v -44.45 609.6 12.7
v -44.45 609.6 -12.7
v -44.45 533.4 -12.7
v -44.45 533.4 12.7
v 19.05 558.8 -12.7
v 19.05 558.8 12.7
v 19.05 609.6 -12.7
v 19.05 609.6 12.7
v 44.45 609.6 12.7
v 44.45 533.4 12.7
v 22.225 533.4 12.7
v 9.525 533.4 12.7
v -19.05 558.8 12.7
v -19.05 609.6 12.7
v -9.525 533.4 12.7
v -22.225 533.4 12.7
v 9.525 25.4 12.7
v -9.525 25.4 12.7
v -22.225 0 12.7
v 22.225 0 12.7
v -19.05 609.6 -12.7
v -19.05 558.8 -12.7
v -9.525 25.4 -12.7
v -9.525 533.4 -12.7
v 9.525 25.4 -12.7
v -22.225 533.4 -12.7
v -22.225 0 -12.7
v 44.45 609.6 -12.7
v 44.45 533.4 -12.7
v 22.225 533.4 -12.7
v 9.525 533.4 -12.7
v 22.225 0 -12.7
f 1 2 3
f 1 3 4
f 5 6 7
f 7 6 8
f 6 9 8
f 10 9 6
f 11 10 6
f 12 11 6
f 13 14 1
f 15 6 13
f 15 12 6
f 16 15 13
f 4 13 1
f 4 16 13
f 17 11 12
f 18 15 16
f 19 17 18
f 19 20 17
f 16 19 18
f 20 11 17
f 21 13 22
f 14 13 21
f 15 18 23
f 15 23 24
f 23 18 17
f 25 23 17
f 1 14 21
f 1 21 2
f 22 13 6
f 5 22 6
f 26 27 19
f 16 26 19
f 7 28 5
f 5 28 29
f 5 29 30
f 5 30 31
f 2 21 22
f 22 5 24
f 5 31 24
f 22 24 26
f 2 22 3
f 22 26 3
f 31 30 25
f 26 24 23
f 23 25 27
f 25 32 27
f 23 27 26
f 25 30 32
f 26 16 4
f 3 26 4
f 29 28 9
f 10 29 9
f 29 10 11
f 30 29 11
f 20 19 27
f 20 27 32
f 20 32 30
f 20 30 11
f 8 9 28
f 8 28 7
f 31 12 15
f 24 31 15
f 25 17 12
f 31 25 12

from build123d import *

# Parameters (mm, degrees)
F0_W     = 44.45
F0_H     = 25.4
F1_DEPTH = 533.4
F2_W     = 19.05
F2_H     = 508
F3_DEPTH = 25.4
F4_W     = 88.9
F4_H     = 25.4
F5_DEPTH = 76.2
F6_W     = 38.1
F6_H     = 50.8
F7_DEPTH = 25.4


with BuildPart() as f1:
    # F0 (on Front) → F1 (new body)
    with BuildSketch(Plane.XZ):
        Rectangle(F0_W, F0_H)
    extrude(amount=-F1_DEPTH)

    # F2 (on face) → F3 (cut)
    with BuildSketch(Plane.XY.offset(12.7)):
        with Locations((0, 279.4)):
            Rectangle(F2_W, F2_H)
    extrude(amount=-F3_DEPTH, mode=Mode.SUBTRACT)

    # F4 (on face) → F5 (join)
    with BuildSketch(Plane(origin=(0, 533.4, 0), x_dir=(-1, 0, 0), z_dir=(0, 1, 0))):
        Rectangle(F4_W, F4_H)
    extrude(amount=F5_DEPTH)

    # F6 (on face) → F7 (cut)
    with BuildSketch(Plane.XY.offset(12.7)):
        with Locations((0, 584.2)):
            Rectangle(F6_W, F6_H)
    extrude(amount=-F7_DEPTH, mode=Mode.SUBTRACT)


solid = f1.part
